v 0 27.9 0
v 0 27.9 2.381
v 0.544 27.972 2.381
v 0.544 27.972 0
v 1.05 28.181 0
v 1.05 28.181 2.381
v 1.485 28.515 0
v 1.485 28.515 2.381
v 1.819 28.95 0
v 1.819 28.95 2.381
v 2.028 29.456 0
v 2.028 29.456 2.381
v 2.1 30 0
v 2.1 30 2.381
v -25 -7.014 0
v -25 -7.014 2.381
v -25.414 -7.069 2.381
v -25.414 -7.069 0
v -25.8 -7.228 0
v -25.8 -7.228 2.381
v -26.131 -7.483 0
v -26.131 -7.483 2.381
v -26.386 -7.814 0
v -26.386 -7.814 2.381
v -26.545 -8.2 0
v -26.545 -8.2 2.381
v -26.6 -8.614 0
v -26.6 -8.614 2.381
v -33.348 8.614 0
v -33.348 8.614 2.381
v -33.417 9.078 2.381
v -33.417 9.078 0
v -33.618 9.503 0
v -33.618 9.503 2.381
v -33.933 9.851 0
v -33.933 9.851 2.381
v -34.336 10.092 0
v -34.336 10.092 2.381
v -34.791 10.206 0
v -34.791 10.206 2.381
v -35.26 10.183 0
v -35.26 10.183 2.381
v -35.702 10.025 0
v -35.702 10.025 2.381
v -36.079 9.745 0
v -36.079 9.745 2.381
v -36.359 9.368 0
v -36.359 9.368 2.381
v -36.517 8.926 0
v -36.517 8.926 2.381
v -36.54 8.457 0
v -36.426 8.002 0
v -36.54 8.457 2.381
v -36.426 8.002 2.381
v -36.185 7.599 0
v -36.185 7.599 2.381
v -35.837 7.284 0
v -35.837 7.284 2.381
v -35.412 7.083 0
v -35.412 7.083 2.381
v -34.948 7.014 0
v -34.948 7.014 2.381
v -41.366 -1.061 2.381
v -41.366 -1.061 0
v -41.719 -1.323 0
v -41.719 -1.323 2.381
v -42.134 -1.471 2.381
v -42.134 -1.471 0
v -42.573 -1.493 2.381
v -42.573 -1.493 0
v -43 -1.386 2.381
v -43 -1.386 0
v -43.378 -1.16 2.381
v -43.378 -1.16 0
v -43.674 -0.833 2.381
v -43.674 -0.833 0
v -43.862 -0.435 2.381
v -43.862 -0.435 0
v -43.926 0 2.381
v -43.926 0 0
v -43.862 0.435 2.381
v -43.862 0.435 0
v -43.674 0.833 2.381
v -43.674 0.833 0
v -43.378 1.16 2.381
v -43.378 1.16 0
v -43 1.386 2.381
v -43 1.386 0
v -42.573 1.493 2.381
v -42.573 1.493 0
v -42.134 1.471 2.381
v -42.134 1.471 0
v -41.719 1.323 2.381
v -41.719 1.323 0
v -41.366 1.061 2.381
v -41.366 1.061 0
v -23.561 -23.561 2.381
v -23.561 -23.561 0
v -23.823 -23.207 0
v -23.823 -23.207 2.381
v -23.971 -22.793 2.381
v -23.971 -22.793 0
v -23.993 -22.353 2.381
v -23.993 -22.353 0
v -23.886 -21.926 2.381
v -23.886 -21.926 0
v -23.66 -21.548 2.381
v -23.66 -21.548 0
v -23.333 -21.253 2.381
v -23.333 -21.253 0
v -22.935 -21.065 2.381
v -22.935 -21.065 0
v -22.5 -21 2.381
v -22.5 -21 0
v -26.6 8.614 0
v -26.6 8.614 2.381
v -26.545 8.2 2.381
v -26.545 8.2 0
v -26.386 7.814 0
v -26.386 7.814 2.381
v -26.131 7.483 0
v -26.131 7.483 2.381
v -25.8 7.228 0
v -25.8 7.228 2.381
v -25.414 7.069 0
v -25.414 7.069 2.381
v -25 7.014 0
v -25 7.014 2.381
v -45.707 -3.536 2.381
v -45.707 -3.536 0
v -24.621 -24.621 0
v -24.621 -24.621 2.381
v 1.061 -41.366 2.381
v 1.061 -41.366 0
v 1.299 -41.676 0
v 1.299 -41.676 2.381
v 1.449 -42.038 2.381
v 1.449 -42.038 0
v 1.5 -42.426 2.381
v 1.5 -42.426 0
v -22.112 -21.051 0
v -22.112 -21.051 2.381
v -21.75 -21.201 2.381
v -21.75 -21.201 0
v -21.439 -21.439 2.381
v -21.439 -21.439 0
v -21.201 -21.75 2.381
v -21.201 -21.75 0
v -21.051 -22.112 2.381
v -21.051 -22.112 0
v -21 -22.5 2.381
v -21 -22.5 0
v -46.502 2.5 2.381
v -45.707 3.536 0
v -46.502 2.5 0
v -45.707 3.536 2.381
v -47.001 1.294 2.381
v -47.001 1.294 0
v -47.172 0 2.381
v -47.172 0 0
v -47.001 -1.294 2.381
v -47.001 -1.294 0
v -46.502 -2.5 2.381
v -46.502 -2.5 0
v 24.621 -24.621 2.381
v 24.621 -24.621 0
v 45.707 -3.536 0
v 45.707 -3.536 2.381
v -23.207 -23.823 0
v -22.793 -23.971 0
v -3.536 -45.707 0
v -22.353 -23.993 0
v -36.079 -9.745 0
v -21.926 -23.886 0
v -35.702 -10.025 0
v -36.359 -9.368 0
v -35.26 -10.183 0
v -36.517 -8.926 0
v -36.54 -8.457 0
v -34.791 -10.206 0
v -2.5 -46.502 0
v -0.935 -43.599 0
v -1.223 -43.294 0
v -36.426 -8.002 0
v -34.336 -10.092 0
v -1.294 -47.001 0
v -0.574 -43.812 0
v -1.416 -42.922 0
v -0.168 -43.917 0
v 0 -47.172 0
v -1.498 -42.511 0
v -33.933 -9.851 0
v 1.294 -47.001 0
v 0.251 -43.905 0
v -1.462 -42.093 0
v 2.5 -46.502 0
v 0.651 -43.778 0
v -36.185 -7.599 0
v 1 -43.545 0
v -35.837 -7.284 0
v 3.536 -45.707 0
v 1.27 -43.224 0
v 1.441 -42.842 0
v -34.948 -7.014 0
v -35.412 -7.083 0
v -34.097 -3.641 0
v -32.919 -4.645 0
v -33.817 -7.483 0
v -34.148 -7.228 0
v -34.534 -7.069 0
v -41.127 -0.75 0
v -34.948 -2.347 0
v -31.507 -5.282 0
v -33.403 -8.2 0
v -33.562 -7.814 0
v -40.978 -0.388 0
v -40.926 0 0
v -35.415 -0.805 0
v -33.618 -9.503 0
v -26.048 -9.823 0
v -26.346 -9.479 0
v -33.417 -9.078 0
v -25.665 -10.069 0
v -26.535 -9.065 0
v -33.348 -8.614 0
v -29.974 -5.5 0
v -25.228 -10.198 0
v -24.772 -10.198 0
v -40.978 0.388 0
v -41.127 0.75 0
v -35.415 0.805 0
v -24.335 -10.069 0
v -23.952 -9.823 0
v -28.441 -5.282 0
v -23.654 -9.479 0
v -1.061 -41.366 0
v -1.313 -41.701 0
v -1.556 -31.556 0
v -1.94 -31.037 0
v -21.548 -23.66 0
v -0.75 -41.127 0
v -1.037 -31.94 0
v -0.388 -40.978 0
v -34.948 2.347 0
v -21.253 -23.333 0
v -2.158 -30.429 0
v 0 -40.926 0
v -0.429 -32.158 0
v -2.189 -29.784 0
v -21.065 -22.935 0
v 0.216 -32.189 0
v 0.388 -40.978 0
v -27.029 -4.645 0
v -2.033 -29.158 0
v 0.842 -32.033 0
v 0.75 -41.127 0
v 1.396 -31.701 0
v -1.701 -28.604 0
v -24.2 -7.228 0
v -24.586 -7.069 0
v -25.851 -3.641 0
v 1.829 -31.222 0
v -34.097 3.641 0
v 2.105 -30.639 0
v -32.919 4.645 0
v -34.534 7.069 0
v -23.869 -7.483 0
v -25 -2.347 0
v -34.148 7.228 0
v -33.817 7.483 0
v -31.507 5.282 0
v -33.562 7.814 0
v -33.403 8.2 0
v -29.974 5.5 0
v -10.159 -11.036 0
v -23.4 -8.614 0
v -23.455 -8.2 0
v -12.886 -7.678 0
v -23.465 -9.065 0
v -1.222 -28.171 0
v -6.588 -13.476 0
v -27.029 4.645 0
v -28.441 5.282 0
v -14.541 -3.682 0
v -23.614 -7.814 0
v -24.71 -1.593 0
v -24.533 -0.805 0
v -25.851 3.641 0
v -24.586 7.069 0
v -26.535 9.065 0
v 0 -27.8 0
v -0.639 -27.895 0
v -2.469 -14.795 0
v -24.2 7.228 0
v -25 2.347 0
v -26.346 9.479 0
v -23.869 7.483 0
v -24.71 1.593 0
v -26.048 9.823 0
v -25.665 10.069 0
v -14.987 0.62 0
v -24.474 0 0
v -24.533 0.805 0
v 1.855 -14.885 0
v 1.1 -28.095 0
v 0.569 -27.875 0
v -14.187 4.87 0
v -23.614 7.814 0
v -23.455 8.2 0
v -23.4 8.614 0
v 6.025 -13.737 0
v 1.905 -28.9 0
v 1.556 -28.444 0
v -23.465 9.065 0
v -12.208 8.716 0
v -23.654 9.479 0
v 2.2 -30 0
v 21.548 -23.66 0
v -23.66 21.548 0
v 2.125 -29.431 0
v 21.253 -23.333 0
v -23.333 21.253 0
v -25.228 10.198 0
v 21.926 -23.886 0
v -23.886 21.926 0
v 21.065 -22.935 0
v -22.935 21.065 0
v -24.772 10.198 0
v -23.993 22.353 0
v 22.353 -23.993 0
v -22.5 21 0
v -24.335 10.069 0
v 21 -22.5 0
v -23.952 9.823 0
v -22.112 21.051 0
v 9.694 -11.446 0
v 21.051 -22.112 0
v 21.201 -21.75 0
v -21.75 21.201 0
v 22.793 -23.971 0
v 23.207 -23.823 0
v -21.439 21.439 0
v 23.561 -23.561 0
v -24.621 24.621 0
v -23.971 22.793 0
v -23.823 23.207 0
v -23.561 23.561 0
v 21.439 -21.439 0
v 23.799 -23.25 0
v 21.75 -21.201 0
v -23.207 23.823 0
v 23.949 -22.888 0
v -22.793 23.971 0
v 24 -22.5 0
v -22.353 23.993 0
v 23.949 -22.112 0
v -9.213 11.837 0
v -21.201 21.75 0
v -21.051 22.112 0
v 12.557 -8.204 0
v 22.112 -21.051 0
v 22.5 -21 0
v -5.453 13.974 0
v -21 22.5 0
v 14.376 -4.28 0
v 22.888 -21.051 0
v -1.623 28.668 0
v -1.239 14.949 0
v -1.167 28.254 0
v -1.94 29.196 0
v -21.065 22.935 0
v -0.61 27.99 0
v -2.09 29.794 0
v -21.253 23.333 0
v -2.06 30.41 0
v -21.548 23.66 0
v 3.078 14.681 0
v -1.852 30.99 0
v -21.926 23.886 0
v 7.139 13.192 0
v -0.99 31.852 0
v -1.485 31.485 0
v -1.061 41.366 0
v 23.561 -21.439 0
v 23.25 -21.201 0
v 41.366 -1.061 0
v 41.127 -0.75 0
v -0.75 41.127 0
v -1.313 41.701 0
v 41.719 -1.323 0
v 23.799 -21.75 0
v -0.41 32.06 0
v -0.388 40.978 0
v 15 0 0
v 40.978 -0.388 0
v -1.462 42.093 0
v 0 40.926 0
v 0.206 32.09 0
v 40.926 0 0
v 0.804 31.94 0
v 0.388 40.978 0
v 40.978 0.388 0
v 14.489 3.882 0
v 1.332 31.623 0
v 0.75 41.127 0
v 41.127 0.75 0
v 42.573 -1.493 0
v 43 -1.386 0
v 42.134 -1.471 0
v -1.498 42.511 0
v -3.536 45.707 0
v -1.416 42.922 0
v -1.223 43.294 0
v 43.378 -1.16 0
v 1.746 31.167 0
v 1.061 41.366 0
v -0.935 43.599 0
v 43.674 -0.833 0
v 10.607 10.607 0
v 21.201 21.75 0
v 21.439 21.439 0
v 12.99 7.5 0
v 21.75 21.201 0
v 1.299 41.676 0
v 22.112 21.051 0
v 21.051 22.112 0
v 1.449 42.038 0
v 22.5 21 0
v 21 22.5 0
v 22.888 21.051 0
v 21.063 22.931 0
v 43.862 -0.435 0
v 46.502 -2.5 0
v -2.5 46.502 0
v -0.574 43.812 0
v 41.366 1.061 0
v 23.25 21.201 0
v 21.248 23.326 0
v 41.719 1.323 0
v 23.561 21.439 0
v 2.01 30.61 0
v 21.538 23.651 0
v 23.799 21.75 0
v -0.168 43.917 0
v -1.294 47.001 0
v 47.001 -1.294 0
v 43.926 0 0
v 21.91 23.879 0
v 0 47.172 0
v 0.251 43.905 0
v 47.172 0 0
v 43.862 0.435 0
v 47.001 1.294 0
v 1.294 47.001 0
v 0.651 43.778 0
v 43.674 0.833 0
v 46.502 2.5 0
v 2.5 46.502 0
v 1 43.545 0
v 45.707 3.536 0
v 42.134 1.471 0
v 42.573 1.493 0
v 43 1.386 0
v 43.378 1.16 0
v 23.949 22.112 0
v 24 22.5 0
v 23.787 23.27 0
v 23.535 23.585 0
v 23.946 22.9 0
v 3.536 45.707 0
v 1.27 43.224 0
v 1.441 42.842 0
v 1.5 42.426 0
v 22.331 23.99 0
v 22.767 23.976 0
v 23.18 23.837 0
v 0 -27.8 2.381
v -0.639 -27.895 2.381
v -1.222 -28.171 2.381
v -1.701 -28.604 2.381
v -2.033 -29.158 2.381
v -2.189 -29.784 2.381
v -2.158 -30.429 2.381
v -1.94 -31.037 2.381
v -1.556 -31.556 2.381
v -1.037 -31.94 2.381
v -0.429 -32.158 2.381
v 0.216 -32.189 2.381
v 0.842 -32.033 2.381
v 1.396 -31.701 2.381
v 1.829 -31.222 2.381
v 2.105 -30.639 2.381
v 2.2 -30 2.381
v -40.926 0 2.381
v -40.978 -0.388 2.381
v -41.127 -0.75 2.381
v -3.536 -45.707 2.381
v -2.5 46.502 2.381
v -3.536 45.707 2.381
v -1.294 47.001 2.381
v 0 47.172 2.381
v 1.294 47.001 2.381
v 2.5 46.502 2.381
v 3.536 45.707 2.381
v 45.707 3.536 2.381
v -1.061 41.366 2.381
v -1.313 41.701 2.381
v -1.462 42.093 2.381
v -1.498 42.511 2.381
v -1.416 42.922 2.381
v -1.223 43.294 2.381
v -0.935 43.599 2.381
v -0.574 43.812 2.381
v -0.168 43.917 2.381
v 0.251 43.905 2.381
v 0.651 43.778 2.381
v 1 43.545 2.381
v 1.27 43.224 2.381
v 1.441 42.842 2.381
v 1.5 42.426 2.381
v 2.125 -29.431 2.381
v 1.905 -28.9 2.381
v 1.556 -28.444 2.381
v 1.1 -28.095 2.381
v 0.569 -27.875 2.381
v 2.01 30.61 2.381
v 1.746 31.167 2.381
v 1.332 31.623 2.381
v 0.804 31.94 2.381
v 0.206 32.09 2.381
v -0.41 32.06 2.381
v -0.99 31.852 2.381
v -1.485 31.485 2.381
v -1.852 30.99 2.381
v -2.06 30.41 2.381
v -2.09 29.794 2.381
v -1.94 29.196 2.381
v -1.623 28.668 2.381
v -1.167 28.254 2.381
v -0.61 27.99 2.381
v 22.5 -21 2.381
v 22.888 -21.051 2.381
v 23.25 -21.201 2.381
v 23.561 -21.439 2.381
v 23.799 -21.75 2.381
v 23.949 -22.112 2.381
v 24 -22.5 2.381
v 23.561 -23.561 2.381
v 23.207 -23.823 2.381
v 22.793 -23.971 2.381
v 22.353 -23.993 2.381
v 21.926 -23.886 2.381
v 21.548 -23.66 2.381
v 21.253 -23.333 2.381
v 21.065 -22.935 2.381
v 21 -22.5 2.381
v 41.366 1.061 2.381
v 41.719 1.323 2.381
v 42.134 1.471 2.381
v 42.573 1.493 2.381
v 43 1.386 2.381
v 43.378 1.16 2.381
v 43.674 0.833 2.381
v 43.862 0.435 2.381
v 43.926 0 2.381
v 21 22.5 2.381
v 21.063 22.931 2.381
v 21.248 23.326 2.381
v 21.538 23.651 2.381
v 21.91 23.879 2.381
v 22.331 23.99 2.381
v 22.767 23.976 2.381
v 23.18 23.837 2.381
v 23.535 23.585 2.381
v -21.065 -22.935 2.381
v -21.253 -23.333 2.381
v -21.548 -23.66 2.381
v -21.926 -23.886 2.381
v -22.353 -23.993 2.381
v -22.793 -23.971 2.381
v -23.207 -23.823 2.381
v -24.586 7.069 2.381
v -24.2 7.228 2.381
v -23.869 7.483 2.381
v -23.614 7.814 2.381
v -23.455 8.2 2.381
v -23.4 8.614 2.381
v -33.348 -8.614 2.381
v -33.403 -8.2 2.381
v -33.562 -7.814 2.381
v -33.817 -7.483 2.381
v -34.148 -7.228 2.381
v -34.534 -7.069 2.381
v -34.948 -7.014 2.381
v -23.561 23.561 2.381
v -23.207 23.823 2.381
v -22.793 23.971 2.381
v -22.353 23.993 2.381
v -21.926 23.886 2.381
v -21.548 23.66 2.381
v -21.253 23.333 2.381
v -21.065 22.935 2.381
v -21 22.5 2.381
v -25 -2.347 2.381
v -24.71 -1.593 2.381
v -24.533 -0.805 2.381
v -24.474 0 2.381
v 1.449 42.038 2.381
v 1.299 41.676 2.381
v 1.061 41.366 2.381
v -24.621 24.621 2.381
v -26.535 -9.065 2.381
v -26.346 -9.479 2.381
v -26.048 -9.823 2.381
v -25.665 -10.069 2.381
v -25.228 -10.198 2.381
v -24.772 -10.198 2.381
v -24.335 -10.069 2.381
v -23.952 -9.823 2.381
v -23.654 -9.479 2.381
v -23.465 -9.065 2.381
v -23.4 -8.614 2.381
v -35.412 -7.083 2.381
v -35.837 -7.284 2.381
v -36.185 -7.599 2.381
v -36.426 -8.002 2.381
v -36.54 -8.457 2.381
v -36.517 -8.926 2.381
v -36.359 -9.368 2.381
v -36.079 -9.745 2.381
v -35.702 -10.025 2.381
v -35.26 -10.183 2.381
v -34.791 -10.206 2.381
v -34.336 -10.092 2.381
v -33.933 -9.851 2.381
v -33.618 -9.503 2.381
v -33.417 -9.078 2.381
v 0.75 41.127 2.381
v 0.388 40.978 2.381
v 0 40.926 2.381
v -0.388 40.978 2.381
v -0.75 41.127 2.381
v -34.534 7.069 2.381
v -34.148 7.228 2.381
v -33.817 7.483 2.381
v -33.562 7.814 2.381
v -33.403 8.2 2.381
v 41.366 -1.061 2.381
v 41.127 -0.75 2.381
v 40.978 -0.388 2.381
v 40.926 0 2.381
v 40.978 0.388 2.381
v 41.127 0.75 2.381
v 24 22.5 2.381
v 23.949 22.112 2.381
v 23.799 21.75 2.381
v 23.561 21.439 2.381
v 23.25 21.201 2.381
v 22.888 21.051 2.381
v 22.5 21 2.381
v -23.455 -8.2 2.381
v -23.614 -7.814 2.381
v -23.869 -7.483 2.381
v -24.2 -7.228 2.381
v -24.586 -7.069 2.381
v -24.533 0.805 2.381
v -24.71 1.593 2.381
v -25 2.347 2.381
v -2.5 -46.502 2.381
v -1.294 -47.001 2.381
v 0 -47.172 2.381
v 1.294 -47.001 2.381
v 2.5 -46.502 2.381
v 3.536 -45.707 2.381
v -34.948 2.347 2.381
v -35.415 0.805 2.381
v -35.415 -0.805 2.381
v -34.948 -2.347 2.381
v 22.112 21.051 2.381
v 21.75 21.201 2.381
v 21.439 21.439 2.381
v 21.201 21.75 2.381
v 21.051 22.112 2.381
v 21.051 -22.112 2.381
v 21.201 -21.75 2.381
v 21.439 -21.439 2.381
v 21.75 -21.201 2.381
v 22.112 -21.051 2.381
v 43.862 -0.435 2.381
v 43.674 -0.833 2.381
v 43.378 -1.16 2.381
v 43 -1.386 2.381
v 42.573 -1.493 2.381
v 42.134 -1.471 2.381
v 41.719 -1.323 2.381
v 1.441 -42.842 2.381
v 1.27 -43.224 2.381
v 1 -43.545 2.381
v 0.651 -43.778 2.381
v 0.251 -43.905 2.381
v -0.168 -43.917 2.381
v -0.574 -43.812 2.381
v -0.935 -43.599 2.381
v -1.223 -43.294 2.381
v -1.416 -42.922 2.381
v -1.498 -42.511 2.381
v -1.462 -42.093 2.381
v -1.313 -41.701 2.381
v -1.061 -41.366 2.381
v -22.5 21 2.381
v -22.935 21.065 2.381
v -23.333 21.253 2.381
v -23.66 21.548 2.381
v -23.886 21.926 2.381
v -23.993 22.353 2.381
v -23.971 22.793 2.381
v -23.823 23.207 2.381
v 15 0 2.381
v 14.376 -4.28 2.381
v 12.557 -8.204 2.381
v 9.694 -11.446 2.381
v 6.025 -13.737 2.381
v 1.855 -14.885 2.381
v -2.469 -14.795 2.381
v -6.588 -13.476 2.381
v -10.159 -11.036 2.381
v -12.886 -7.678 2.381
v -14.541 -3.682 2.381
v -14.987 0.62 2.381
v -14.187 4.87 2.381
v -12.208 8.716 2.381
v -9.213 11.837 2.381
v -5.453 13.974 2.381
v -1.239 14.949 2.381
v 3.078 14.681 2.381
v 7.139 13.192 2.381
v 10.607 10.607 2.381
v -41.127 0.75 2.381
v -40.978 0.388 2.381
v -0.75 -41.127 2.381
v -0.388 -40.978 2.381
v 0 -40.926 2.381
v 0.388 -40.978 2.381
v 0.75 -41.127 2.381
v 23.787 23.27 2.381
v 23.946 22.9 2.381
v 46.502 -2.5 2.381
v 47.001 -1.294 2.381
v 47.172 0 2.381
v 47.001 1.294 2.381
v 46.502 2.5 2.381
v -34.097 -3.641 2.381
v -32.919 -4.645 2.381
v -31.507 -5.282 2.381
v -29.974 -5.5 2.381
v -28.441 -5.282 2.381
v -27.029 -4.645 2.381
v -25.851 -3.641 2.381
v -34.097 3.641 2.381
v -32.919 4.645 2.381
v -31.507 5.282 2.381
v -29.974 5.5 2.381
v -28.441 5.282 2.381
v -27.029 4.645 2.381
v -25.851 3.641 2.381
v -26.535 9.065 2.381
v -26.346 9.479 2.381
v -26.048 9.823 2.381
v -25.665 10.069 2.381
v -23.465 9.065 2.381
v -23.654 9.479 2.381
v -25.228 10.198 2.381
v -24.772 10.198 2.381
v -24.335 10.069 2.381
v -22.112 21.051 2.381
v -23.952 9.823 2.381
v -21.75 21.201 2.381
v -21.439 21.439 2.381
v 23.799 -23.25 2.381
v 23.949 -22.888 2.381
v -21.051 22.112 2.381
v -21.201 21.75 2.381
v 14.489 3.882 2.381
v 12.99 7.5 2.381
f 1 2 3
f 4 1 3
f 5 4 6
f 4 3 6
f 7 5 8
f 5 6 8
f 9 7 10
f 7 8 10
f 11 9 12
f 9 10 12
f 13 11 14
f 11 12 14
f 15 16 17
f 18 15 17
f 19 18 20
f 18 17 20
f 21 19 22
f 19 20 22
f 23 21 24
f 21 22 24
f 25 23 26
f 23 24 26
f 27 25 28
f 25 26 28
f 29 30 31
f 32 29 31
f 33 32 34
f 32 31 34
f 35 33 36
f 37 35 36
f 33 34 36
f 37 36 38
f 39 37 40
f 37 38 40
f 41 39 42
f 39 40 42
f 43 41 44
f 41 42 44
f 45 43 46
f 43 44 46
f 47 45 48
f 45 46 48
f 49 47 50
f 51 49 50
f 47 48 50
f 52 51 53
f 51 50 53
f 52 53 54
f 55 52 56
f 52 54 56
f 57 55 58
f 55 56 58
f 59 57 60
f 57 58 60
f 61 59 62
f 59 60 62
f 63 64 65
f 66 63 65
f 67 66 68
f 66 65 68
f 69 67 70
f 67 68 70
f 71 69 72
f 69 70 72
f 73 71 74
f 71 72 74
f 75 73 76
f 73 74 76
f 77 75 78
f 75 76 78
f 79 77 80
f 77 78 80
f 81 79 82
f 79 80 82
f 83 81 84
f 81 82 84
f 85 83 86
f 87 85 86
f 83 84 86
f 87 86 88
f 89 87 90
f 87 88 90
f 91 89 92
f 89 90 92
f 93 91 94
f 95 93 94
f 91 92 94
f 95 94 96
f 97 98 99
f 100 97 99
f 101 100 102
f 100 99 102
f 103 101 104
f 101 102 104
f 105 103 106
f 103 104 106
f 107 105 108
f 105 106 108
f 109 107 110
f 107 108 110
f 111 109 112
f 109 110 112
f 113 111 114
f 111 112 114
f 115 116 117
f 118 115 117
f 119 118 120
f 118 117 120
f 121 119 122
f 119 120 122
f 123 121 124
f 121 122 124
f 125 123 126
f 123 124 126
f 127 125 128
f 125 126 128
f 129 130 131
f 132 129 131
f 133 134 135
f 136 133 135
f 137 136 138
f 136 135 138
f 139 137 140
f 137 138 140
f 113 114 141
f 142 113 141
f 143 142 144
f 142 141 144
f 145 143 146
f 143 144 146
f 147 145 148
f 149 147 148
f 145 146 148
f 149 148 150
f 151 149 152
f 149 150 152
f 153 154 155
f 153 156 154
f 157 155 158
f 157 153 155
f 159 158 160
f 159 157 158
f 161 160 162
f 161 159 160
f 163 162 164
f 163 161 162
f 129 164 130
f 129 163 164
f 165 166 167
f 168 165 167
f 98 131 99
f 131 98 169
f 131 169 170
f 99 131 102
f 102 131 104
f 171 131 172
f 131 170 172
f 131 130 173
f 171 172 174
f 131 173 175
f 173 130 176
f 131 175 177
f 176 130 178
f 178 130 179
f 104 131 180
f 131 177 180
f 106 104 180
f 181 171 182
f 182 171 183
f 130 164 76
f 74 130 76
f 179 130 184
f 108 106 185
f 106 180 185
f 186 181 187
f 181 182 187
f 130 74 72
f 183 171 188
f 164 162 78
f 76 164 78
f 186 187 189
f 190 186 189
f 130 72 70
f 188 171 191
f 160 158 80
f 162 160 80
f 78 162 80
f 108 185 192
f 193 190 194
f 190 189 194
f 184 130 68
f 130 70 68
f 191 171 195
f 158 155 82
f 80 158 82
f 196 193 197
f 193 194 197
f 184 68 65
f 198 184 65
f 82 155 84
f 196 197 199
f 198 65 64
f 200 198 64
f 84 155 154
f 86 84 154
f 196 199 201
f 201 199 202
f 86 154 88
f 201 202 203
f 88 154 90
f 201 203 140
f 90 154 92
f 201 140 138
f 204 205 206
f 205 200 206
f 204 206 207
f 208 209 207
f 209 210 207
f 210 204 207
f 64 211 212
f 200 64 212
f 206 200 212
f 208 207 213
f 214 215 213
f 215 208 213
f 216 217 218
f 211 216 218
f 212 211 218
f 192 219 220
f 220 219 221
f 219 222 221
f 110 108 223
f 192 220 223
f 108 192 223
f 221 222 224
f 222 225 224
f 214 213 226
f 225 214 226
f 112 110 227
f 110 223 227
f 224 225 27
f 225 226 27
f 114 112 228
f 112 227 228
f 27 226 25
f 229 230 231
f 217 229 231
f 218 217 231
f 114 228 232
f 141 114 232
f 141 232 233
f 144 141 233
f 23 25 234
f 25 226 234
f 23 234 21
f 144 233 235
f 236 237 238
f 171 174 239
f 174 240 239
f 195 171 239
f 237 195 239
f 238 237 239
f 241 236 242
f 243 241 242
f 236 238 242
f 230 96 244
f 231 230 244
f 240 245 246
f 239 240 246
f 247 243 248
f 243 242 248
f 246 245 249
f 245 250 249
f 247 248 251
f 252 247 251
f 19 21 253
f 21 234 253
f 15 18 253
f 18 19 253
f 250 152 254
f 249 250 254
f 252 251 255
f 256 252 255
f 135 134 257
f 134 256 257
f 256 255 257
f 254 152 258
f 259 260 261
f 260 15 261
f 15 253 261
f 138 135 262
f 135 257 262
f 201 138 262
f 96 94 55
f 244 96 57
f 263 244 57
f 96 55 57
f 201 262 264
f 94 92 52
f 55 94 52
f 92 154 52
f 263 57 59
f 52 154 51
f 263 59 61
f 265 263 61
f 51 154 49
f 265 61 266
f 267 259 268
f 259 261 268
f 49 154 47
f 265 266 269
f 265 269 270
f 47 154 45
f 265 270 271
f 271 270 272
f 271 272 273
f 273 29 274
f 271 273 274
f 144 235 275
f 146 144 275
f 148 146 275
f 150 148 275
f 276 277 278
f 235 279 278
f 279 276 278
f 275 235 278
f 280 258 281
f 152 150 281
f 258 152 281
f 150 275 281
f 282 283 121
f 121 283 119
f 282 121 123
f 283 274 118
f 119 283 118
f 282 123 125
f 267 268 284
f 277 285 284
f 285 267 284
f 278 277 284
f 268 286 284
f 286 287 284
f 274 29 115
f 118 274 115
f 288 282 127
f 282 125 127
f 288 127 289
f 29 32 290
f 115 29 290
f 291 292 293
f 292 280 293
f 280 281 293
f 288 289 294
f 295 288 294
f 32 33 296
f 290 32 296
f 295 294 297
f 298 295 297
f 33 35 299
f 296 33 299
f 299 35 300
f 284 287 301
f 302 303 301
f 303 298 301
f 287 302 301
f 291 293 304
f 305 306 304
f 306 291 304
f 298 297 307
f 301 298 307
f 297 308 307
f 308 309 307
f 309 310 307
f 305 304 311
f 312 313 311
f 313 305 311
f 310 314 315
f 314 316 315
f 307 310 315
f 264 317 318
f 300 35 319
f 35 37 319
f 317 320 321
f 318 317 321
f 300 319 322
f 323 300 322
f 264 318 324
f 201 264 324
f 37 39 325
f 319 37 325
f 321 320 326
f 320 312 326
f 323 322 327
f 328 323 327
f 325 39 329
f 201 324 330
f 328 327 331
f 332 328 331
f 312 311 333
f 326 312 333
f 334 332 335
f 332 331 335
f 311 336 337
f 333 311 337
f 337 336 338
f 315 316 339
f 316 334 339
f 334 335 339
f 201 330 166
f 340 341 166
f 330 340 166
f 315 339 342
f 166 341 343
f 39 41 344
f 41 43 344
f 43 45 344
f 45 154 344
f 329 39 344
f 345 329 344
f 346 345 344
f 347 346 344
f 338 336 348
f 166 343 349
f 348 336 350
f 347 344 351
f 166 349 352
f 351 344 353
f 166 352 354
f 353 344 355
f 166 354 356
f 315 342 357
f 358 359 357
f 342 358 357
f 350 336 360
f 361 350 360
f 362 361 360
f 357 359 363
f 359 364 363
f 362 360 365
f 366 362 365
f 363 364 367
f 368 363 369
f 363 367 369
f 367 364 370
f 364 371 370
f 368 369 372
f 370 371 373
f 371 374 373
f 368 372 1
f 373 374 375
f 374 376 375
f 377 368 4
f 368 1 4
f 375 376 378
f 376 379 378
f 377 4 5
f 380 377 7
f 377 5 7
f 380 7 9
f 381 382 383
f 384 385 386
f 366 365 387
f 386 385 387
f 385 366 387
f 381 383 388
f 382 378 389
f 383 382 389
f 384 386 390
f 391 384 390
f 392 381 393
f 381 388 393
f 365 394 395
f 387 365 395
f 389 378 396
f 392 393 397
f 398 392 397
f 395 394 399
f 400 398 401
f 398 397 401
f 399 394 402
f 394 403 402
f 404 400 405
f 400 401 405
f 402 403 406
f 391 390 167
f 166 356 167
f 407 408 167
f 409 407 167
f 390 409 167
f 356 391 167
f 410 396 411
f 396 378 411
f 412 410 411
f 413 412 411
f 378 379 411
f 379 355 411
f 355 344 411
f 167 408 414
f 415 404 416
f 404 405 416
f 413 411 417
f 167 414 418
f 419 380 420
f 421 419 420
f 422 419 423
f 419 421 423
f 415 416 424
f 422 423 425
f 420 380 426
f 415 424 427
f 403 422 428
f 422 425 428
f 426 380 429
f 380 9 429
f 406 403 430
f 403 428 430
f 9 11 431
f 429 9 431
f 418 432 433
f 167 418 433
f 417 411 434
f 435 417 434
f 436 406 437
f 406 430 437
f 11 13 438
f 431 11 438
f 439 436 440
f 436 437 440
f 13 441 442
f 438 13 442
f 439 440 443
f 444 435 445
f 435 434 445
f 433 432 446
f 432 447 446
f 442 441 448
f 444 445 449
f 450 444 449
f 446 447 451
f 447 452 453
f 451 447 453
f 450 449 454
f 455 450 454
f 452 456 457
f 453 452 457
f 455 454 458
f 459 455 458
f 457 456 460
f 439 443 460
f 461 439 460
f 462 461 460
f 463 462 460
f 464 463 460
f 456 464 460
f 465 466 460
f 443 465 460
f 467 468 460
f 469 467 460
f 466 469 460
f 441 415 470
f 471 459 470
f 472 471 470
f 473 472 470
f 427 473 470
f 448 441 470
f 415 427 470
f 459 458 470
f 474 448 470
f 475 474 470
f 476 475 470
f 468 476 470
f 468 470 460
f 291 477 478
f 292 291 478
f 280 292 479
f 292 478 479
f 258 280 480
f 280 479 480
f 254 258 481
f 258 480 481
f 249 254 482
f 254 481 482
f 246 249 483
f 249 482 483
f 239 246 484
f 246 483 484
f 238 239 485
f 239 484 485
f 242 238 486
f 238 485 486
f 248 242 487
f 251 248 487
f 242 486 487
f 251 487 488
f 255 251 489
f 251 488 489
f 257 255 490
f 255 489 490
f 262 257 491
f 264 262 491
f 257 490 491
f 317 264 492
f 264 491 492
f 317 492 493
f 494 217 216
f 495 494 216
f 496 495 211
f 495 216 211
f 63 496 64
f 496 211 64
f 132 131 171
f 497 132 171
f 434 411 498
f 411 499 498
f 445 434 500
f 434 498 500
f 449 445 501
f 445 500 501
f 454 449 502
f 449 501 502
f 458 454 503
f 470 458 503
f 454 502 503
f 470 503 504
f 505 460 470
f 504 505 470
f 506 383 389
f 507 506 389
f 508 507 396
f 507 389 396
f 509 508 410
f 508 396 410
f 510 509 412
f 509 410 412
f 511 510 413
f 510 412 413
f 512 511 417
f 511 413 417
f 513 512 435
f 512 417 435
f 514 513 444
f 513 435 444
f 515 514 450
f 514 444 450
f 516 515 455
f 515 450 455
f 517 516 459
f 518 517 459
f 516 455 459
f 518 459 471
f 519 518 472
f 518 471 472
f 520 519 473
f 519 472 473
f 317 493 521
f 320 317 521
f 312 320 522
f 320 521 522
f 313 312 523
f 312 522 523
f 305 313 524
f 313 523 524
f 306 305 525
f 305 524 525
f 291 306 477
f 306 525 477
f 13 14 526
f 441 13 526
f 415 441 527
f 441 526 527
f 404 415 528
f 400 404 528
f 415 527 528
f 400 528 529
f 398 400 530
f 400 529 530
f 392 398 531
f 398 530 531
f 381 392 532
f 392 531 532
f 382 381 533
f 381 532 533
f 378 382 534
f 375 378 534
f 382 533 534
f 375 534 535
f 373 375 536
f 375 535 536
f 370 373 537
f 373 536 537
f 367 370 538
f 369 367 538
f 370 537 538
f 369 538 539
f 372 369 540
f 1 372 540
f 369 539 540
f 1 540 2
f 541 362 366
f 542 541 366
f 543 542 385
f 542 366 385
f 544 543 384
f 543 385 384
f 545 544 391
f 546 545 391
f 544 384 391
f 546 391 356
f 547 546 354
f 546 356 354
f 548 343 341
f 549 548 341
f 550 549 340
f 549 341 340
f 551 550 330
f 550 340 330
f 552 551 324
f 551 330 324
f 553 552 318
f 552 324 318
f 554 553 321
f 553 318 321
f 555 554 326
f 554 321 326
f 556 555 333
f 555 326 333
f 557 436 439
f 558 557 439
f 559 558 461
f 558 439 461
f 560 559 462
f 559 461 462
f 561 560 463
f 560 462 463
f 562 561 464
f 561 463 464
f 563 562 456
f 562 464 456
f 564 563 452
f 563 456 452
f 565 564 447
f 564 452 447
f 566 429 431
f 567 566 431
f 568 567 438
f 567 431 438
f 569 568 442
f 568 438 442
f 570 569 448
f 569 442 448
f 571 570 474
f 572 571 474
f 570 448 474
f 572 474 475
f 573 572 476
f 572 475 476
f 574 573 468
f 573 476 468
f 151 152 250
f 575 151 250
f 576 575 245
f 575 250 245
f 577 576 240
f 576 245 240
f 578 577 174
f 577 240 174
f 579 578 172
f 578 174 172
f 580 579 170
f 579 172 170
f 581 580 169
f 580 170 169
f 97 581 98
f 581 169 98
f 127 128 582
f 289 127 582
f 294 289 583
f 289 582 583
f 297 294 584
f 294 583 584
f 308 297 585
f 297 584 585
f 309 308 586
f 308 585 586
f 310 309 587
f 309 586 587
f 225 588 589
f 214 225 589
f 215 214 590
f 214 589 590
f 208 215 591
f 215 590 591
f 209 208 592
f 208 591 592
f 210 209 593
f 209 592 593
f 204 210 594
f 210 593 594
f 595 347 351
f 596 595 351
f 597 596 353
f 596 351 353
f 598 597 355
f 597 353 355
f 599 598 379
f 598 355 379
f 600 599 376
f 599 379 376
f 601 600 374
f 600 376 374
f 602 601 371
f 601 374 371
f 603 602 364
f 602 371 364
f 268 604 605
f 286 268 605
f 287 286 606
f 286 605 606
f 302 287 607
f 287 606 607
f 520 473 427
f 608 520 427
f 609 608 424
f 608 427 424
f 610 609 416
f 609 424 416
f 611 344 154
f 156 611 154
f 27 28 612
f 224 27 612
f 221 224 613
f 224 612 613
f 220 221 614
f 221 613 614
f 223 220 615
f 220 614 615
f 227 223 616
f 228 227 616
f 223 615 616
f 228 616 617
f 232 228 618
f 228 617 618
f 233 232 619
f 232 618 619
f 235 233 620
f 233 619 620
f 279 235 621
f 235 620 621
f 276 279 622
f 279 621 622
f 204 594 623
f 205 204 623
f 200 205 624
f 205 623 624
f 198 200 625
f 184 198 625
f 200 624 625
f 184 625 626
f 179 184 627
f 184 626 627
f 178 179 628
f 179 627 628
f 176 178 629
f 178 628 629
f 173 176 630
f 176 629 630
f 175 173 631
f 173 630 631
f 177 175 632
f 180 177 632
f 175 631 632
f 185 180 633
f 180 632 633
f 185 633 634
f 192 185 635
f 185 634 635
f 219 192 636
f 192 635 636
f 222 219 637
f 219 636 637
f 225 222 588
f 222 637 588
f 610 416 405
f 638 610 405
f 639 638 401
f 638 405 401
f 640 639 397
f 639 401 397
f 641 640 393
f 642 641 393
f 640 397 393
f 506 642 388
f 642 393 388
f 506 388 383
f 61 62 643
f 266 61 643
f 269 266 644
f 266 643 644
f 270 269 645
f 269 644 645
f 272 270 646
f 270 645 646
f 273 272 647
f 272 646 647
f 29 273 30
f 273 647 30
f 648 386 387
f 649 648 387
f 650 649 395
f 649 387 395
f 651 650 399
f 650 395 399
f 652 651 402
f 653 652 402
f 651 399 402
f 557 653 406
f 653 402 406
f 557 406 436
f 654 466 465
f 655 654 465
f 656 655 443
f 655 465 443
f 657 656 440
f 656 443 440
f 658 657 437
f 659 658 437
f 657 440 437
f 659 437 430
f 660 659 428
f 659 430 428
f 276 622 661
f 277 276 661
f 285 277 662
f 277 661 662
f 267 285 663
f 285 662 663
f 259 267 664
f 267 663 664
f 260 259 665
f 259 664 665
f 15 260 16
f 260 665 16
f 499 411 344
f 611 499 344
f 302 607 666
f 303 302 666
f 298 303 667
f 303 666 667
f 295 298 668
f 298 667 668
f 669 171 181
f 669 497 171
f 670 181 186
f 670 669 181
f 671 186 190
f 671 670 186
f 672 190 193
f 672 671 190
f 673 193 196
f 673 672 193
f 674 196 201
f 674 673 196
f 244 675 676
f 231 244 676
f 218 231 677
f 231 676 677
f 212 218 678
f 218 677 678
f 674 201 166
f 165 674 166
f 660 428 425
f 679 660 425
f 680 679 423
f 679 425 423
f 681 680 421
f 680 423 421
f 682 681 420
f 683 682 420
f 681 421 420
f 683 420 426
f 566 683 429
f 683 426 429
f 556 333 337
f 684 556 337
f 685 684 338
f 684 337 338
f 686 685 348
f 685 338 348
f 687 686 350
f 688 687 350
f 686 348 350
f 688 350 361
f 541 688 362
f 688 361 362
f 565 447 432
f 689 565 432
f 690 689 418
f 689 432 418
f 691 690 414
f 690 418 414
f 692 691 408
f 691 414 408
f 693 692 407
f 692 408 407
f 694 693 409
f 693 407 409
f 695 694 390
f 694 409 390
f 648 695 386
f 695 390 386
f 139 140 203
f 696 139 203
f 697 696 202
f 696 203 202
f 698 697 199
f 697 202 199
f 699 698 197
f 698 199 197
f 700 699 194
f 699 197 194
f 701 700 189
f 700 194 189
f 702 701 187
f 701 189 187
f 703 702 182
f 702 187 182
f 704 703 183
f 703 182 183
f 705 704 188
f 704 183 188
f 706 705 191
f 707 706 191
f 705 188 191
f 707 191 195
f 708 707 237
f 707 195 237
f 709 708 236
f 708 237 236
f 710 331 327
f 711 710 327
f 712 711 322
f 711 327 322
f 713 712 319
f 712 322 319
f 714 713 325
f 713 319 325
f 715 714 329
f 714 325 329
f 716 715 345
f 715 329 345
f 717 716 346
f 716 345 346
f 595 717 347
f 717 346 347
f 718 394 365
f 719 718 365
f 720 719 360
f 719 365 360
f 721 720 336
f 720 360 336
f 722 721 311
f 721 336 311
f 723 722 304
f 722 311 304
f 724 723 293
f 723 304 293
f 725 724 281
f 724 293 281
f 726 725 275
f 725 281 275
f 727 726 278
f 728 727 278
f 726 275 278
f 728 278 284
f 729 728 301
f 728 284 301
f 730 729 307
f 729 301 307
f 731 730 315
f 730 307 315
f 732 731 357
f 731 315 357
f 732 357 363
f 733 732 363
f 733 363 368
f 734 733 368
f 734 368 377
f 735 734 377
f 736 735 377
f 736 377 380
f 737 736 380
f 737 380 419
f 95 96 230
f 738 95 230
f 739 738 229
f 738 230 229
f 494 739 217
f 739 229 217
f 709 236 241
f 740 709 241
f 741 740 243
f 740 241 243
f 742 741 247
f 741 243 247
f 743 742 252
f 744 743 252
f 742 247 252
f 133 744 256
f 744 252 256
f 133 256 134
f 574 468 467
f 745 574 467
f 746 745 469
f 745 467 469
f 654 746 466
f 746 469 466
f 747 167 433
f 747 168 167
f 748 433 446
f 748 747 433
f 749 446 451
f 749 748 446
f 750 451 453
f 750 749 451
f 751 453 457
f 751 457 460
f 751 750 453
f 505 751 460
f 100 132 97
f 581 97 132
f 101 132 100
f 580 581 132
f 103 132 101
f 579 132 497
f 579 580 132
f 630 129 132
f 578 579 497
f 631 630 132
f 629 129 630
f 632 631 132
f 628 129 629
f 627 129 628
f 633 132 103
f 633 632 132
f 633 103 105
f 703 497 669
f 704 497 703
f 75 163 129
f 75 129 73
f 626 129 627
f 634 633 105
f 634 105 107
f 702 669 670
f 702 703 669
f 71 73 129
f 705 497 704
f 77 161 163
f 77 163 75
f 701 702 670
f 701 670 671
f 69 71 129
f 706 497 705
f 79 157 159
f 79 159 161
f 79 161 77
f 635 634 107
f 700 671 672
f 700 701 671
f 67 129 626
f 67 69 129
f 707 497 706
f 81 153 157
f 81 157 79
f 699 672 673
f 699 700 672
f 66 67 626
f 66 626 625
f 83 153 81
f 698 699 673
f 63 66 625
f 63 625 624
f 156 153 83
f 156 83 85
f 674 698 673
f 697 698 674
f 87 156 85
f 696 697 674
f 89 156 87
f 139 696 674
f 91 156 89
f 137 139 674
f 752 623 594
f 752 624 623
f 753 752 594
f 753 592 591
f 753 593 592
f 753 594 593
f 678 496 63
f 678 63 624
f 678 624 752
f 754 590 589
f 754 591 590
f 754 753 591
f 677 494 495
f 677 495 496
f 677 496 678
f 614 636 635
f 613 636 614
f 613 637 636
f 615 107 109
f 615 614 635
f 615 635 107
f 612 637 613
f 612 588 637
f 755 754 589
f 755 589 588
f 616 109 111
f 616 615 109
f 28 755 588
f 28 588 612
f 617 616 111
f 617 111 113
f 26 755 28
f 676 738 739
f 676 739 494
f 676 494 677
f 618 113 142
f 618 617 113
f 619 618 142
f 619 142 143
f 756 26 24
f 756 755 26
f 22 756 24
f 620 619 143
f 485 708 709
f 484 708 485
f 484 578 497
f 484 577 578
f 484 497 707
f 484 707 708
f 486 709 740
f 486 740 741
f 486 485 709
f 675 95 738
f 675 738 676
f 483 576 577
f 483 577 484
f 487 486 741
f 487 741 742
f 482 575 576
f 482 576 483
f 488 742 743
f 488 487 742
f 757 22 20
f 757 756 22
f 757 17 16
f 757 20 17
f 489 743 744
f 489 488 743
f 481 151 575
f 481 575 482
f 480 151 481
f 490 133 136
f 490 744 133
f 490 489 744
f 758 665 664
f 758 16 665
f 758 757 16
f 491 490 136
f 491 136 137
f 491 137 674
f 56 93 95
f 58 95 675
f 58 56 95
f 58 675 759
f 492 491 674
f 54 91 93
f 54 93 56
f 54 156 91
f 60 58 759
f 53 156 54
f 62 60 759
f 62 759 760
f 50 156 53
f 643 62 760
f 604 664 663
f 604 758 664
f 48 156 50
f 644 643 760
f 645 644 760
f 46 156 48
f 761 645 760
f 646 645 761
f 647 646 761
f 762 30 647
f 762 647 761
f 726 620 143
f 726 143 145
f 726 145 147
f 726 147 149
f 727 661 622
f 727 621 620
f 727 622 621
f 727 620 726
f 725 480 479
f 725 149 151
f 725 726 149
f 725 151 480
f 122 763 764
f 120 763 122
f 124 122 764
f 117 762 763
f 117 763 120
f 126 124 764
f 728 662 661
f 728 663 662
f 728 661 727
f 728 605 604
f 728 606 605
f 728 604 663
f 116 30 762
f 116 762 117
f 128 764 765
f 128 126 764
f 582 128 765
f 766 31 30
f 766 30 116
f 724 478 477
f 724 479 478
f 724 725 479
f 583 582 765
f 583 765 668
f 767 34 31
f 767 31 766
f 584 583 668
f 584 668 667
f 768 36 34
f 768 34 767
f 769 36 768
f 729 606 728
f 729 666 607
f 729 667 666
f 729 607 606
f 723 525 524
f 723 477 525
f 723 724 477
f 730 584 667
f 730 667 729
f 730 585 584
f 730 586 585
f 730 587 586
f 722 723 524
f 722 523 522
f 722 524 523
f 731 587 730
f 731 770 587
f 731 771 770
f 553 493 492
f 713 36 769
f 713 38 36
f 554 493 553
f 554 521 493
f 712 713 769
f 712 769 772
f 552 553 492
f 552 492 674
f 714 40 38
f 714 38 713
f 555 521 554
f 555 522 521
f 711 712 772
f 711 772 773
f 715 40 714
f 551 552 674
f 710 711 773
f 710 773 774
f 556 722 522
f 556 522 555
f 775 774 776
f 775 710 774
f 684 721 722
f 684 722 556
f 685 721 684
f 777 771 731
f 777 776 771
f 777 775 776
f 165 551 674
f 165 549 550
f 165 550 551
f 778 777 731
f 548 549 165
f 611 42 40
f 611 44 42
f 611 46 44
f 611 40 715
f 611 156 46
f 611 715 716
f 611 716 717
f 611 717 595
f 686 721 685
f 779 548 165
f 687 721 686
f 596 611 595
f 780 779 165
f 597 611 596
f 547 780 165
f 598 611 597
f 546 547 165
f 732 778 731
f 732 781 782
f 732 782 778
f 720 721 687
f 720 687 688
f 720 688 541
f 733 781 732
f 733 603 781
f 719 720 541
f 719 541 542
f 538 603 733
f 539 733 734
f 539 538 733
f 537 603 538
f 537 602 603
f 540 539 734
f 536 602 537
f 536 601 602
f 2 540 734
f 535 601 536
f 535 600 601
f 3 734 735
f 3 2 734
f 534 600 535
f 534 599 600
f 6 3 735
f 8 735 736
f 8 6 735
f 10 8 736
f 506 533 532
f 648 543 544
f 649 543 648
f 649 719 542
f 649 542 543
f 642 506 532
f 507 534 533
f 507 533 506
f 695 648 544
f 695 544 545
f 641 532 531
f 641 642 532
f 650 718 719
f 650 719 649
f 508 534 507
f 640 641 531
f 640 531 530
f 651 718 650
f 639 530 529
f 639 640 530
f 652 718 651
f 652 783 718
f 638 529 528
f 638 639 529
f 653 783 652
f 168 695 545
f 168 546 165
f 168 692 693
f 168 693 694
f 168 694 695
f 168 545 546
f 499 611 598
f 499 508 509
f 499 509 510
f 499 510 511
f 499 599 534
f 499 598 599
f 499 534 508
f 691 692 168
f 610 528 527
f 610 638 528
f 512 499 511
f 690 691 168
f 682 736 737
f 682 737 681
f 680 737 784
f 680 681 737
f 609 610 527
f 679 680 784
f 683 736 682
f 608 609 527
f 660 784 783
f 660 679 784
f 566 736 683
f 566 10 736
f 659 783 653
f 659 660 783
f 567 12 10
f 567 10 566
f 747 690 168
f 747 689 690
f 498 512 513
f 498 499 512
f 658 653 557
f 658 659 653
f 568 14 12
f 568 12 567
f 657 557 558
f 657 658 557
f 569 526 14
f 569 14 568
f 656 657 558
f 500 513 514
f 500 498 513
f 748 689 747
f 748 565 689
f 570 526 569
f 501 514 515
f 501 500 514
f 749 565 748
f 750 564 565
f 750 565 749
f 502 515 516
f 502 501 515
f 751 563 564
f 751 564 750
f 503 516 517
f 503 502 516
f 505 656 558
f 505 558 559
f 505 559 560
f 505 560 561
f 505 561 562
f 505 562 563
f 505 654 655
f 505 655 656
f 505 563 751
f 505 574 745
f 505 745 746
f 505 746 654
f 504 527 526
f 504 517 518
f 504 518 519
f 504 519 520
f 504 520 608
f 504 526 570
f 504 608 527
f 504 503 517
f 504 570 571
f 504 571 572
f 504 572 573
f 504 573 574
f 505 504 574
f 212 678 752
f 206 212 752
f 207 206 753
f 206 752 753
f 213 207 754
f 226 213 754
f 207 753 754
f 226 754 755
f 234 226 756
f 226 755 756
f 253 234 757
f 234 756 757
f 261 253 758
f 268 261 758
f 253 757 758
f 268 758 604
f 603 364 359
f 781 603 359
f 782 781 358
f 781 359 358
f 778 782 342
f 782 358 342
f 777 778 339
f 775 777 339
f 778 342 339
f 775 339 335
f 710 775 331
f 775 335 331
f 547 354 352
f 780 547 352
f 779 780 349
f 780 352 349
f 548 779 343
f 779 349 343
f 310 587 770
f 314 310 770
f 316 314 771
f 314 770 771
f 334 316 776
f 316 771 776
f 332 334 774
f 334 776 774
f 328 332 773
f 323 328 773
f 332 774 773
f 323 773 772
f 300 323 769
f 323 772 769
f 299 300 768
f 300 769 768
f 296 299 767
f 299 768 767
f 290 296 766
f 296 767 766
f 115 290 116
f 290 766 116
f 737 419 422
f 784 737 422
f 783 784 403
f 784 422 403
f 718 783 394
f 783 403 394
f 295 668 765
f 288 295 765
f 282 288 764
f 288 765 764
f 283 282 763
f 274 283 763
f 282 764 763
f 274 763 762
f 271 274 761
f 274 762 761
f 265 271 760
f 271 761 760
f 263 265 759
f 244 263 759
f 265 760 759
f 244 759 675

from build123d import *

# Parameters (mm, degrees)
F1_DEPTH = 2.38125
F2_R     = 5
F4_DEPTH = 25
F6_DEPTH = 25


# Not quite as in the source:
# - a feature names something its author has since deleted; it is built from what else it names


with BuildPart() as f1:
    # F0 (on Top) → F1 (new body)
    with BuildSketch(Plane.XY):
        with BuildLine():
            Line((19.9264068712, 22.5), (21.2132034356, 21.2132034356))
            Line((21.2132034356, 21.2132034356), (22.5, 19.9264068712))
            Line((22.5, 19.9264068712), (22.5, 21))
            ThreePointArc((22.5, 21), (21.4393398282, 21.4393398282), (21, 22.5))
            Line((21, 22.5), (19.9264068712, 22.5))
        make_face()
        with BuildLine():
            Line((-41.3657466994, 1.0606601718), (-22.5, 19.9264068712))
            Line((-22.5, 19.9264068712), (-22.5, 21))
            ThreePointArc((-22.5, 21), (-23.8858192988, 21.9259748515), (-23.5606601718, 23.5606601718))
            Line((-23.5606601718, 23.5606601718), (-24.6213203436, 24.6213203436))
            Line((-24.6213203436, 24.6213203436), (-49.2426406871, 0))
            Line((-49.2426406871, 0), (-24.6213203436, -24.6213203436))
            Line((-24.6213203436, -24.6213203436), (-23.5606601718, -23.5606601718))
            ThreePointArc((-23.5606601718, -23.5606601718), (-23.8858192988, -21.9259748515), (-22.5, -21))
            Line((-22.5, -21), (-22.5, -19.9264068712))
            Line((-22.5, -19.9264068712), (-41.3657466994, -1.0606601718))
            ThreePointArc((-41.3657466994, -1.0606601718), (-43.9264068712, 0), (-41.3657466994, 1.0606601718))
        make_face()
        with BuildLine():
            Line((21, -22.5), (19.9264068712, -22.5))
            Line((19.9264068712, -22.5), (1.0606601718, -41.3657466994))
            ThreePointArc((1.0606601718, -41.3657466994), (1.3858192988, -41.8523817226), (1.5, -42.4264068712))
            ThreePointArc((1.5, -42.4264068712), (-0.5740251485, -43.81222617), (-1.0606601718, -41.3657466994))
            Line((-1.0606601718, -41.3657466994), (-19.9264068712, -22.5))
            Line((-19.9264068712, -22.5), (-21, -22.5))
            ThreePointArc((-21, -22.5), (-21.9259748515, -23.8858192988), (-23.5606601718, -23.5606601718))
            Line((-23.5606601718, -23.5606601718), (-24.6213203436, -24.6213203436))
            Line((-24.6213203436, -24.6213203436), (0, -49.2426406871))
            Line((0, -49.2426406871), (24.6213203436, -24.6213203436))
            Line((24.6213203436, -24.6213203436), (23.5606601718, -23.5606601718))
            ThreePointArc((23.5606601718, -23.5606601718), (21.9259748515, -23.8858192988), (21, -22.5))
        make_face()
        with BuildLine():
            Line((22.5, 21), (22.5, 19.9264068712))
            Line((22.5, 19.9264068712), (41.3657466994, 1.0606601718))
            ThreePointArc((41.3657466994, 1.0606601718), (43.0004320197, 1.3858192988), (43.9264068712, 0))
            ThreePointArc((43.9264068712, 0), (43.0004320197, -1.3858192988), (41.3657466994, -1.0606601718))
            Line((41.3657466994, -1.0606601718), (22.5, -19.9264068712))
            Line((22.5, -19.9264068712), (22.5, -21))
            ThreePointArc((22.5, -21), (23.5606601718, -21.4393398282), (24, -22.5))
            ThreePointArc((24, -22.5), (23.8858192988, -23.0740251485), (23.5606601718, -23.5606601718))
            Line((23.5606601718, -23.5606601718), (24.6213203436, -24.6213203436))
            Line((24.6213203436, -24.6213203436), (49.2426406871, 0))
            Line((49.2426406871, 0), (0, 49.2426406871))
            Line((0, 49.2426406871), (-24.6213203436, 24.6213203436))
            Line((-24.6213203436, 24.6213203436), (-23.5606601718, 23.5606601718))
            ThreePointArc((-23.5606601718, 23.5606601718), (-21.9259748515, 23.8858192988), (-21, 22.5))
            Line((-21, 22.5), (-19.9264068712, 22.5))
            Line((-19.9264068712, 22.5), (-1.0606601718, 41.3657466994))
            ThreePointArc((-1.0606601718, 41.3657466994), (-0.5740251485, 43.81222617), (1.5, 42.4264068712))
            ThreePointArc((1.5, 42.4264068712), (1.3858192988, 41.8523817226), (1.0606601718, 41.3657466994))
            Line((1.0606601718, 41.3657466994), (19.9264068712, 22.5))
            Line((19.9264068712, 22.5), (21, 22.5))
            ThreePointArc((21, 22.5), (21.9096815497, 23.8789576234), (23.535365503, 23.585365503))
            ThreePointArc((23.535365503, 23.585365503), (23.8789576234, 23.0903184503), (24, 22.5))
            ThreePointArc((24, 22.5), (23.5606601718, 21.4393398282), (22.5, 21))
        make_face()
        with BuildLine():
            Line((-22.5, -19.9264068712), (-22.5, 19.9264068712))
            Line((-22.5, 19.9264068712), (-41.3657466994, 1.0606601718))
            ThreePointArc((-41.3657466994, 1.0606601718), (-41.0405875724, 0.5740251485), (-40.9264068712, 0))
            ThreePointArc((-40.9264068712, 0), (-41.0405875724, -0.5740251485), (-41.3657466994, -1.0606601718))
            Line((-41.3657466994, -1.0606601718), (-22.5, -19.9264068712))
        make_face()
        with BuildLine():
            Line((-19.9264068712, 22.5), (19.9264068712, 22.5))
            Line((19.9264068712, 22.5), (1.0606601718, 41.3657466994))
            ThreePointArc((1.0606601718, 41.3657466994), (0, 40.9264068712), (-1.0606601718, 41.3657466994))
            Line((-1.0606601718, 41.3657466994), (-19.9264068712, 22.5))
        make_face()
        with BuildLine():
            Line((22.5, 19.9264068712), (22.5, 0))
            Line((22.5, 0), (22.5, -19.9264068712))
            Line((22.5, -19.9264068712), (41.3657466994, -1.0606601718))
            ThreePointArc((41.3657466994, -1.0606601718), (40.9264068712, 0), (41.3657466994, 1.0606601718))
            Line((41.3657466994, 1.0606601718), (22.5, 19.9264068712))
        make_face()
        with BuildLine():
            Line((1.0606601718, -41.3657466994), (19.9264068712, -22.5))
            Line((19.9264068712, -22.5), (-19.9264068712, -22.5))
            Line((-19.9264068712, -22.5), (-1.0606601718, -41.3657466994))
            ThreePointArc((-1.0606601718, -41.3657466994), (0, -40.9264068712), (1.0606601718, -41.3657466994))
        make_face()
        with BuildLine():
            Line((22.5, 0), (15, 0))
            ThreePointArc((15, 0), (-13.8581929877, -5.7402514855), (10.6066017178, 10.6066017178))
            Line((10.6066017178, 10.6066017178), (21.2132034356, 21.2132034356))
            Line((21.2132034356, 21.2132034356), (19.9264068712, 22.5))
            Line((19.9264068712, 22.5), (-19.9264068712, 22.5))
            Line((-19.9264068712, 22.5), (-22.5, 19.9264068712))
            Line((-22.5, 19.9264068712), (-22.5, -19.9264068712))
            Line((-22.5, -19.9264068712), (-19.9264068712, -22.5))
            Line((-19.9264068712, -22.5), (19.9264068712, -22.5))
            Line((19.9264068712, -22.5), (22.5, -19.9264068712))
            Line((22.5, -19.9264068712), (22.5, 0))
        make_face()
        with BuildLine():
            ThreePointArc((10.6066017178, 10.6066017178), (13.8581929877, 5.7402514855), (15, 0))
            Line((15, 0), (22.5, 0))
            Line((22.5, 0), (22.5, 19.9264068712))
            Line((22.5, 19.9264068712), (21.2132034356, 21.2132034356))
            Line((21.2132034356, 21.2132034356), (10.6066017178, 10.6066017178))
        make_face()
        with BuildLine():
            Line((-21, -22.5), (-19.9264068712, -22.5))
            Line((-19.9264068712, -22.5), (-22.5, -19.9264068712))
            Line((-22.5, -19.9264068712), (-22.5, -21))
            ThreePointArc((-22.5, -21), (-21.4393398282, -21.4393398282), (-21, -22.5))
        make_face()
        with BuildLine():
            Line((-22.5, 19.9264068712), (-19.9264068712, 22.5))
            Line((-19.9264068712, 22.5), (-21, 22.5))
            ThreePointArc((-21, 22.5), (-21.4393398282, 21.4393398282), (-22.5, 21))
            Line((-22.5, 21), (-22.5, 19.9264068712))
        make_face()
        with BuildLine():
            Line((22.5, -21), (22.5, -19.9264068712))
            Line((22.5, -19.9264068712), (19.9264068712, -22.5))
            Line((19.9264068712, -22.5), (21, -22.5))
            ThreePointArc((21, -22.5), (21.4393398282, -21.4393398282), (22.5, -21))
        make_face()
    extrude(amount=F1_DEPTH)

    # F2
    f2_edges = [f1.edges().sort_by_distance(p)[0] for p in [
        (0, -49.242641, 1.190625),
        (49.242641, 0, 1.190625),
        (0, 49.242641, 1.190625),
        (-49.242641, 0, 1.190625),
    ]]
    fillet(f2_edges, radius=F2_R)

    # F3 (on face) → F4 (cut)
    with BuildSketch(Plane.XY.offset(2.38125)):
        with BuildLine():
            ThreePointArc((-25, -7.014), (-26.1313708499, -7.4826291501), (-26.6, -8.614))
            Line((-26.6, -8.614), (-25, -8.614))
            Line((-25, -8.614), (-25, -7.014))
        make_face()
        with BuildLine():
            Line((-25, -8.614), (-26.6, -8.614))
            ThreePointArc((-26.6, -8.614), (-25, -10.214), (-23.4, -8.614))
            ThreePointArc((-23.4, -8.614), (-23.8686291501, -7.4826291501), (-25, -7.014))
            Line((-25, -7.014), (-25, -8.614))
        make_face()
        with BuildLine():
            ThreePointArc((-34.948, -7.014), (-36.0793708499, -9.7453708499), (-33.348, -8.614))
            Line((-33.348, -8.614), (-34.948, -8.614))
            Line((-34.948, -8.614), (-34.948, -7.014))
        make_face()
        with BuildLine():
            Line((-34.948, -8.614), (-33.348, -8.614))
            ThreePointArc((-33.348, -8.614), (-33.8166291501, -7.4826291501), (-34.948, -7.014))
            Line((-34.948, -7.014), (-34.948, -8.614))
        make_face()
        with BuildLine():
            ThreePointArc((-34.948, -2.3471949216), (-29.974, -5.5), (-25, -2.3471949216))
            Line((-25, -2.3471949216), (-25, 0))
            Line((-25, 0), (-29.974, 0))
            Line((-29.974, 0), (-34.948, 0))
            Line((-34.948, 0), (-34.948, -2.3471949216))
        make_face()
        with BuildLine():
            Line((-25, 0), (-25, -2.3471949216))
            ThreePointArc((-25, -2.3471949216), (-24.6071107707, -1.2027052839), (-24.474, 0))
            Line((-24.474, 0), (-25, 0))
        make_face()
        with BuildLine():
            ThreePointArc((-34.948, 2.3471949216), (-35.474, 0), (-34.948, -2.3471949216))
            Line((-34.948, -2.3471949216), (-34.948, 0))
            Line((-34.948, 0), (-34.948, 2.3471949216))
        make_face()
        with BuildLine():
            Line((-29.974, 0), (-25, 0))
            Line((-25, 0), (-25, 2.3471949216))
            ThreePointArc((-25, 2.3471949216), (-29.974, 5.5), (-34.948, 2.3471949216))
            Line((-34.948, 2.3471949216), (-34.948, 0))
            Line((-34.948, 0), (-29.974, 0))
        make_face()
        with BuildLine():
            Line((-25, 2.3471949216), (-25, 0))
            Line((-25, 0), (-24.474, 0))
            ThreePointArc((-24.474, 0), (-24.6071107707, 1.2027052839), (-25, 2.3471949216))
        make_face()
        with BuildLine():
            Line((-34.948, 8.614), (-34.948, 7.014))
            ThreePointArc((-34.948, 7.014), (-33.8166291501, 7.4826291501), (-33.348, 8.614))
            Line((-33.348, 8.614), (-34.948, 8.614))
        make_face()
        with BuildLine():
            ThreePointArc((-33.348, 8.614), (-36.0793708499, 9.7453708499), (-34.948, 7.014))
            Line((-34.948, 7.014), (-34.948, 8.614))
            Line((-34.948, 8.614), (-33.348, 8.614))
        make_face()
        with BuildLine():
            ThreePointArc((-26.6, 8.614), (-26.1313708499, 7.4826291501), (-25, 7.014))
            Line((-25, 7.014), (-25, 8.614))
            Line((-25, 8.614), (-26.6, 8.614))
        make_face()
        with BuildLine():
            Line((-25, 8.614), (-25, 7.014))
            ThreePointArc((-25, 7.014), (-23.8686291501, 7.4826291501), (-23.4, 8.614))
            ThreePointArc((-23.4, 8.614), (-25, 10.214), (-26.6, 8.614))
            Line((-26.6, 8.614), (-25, 8.614))
        make_face()
    extrude(amount=-F4_DEPTH, mode=Mode.SUBTRACT)

    # F5 (on face) → F6 (cut)
    with BuildSketch(Plane.XY.offset(2.38125)):
        with BuildLine():
            ThreePointArc((2.2, -30), (1.5556349186, -28.4443650814), (0, -27.8))
            ThreePointArc((0, -27.8), (-1.5556349186, -31.5556349186), (2.2, -30))
        make_face()
        with BuildLine():
            ThreePointArc((2.1, 30), (-1.4849242405, 31.4849242405), (0, 27.9))
            ThreePointArc((0, 27.9), (1.4849242405, 28.5150757595), (2.1, 30))
        make_face()
    extrude(amount=-F6_DEPTH, mode=Mode.SUBTRACT)


solid = f1.part
